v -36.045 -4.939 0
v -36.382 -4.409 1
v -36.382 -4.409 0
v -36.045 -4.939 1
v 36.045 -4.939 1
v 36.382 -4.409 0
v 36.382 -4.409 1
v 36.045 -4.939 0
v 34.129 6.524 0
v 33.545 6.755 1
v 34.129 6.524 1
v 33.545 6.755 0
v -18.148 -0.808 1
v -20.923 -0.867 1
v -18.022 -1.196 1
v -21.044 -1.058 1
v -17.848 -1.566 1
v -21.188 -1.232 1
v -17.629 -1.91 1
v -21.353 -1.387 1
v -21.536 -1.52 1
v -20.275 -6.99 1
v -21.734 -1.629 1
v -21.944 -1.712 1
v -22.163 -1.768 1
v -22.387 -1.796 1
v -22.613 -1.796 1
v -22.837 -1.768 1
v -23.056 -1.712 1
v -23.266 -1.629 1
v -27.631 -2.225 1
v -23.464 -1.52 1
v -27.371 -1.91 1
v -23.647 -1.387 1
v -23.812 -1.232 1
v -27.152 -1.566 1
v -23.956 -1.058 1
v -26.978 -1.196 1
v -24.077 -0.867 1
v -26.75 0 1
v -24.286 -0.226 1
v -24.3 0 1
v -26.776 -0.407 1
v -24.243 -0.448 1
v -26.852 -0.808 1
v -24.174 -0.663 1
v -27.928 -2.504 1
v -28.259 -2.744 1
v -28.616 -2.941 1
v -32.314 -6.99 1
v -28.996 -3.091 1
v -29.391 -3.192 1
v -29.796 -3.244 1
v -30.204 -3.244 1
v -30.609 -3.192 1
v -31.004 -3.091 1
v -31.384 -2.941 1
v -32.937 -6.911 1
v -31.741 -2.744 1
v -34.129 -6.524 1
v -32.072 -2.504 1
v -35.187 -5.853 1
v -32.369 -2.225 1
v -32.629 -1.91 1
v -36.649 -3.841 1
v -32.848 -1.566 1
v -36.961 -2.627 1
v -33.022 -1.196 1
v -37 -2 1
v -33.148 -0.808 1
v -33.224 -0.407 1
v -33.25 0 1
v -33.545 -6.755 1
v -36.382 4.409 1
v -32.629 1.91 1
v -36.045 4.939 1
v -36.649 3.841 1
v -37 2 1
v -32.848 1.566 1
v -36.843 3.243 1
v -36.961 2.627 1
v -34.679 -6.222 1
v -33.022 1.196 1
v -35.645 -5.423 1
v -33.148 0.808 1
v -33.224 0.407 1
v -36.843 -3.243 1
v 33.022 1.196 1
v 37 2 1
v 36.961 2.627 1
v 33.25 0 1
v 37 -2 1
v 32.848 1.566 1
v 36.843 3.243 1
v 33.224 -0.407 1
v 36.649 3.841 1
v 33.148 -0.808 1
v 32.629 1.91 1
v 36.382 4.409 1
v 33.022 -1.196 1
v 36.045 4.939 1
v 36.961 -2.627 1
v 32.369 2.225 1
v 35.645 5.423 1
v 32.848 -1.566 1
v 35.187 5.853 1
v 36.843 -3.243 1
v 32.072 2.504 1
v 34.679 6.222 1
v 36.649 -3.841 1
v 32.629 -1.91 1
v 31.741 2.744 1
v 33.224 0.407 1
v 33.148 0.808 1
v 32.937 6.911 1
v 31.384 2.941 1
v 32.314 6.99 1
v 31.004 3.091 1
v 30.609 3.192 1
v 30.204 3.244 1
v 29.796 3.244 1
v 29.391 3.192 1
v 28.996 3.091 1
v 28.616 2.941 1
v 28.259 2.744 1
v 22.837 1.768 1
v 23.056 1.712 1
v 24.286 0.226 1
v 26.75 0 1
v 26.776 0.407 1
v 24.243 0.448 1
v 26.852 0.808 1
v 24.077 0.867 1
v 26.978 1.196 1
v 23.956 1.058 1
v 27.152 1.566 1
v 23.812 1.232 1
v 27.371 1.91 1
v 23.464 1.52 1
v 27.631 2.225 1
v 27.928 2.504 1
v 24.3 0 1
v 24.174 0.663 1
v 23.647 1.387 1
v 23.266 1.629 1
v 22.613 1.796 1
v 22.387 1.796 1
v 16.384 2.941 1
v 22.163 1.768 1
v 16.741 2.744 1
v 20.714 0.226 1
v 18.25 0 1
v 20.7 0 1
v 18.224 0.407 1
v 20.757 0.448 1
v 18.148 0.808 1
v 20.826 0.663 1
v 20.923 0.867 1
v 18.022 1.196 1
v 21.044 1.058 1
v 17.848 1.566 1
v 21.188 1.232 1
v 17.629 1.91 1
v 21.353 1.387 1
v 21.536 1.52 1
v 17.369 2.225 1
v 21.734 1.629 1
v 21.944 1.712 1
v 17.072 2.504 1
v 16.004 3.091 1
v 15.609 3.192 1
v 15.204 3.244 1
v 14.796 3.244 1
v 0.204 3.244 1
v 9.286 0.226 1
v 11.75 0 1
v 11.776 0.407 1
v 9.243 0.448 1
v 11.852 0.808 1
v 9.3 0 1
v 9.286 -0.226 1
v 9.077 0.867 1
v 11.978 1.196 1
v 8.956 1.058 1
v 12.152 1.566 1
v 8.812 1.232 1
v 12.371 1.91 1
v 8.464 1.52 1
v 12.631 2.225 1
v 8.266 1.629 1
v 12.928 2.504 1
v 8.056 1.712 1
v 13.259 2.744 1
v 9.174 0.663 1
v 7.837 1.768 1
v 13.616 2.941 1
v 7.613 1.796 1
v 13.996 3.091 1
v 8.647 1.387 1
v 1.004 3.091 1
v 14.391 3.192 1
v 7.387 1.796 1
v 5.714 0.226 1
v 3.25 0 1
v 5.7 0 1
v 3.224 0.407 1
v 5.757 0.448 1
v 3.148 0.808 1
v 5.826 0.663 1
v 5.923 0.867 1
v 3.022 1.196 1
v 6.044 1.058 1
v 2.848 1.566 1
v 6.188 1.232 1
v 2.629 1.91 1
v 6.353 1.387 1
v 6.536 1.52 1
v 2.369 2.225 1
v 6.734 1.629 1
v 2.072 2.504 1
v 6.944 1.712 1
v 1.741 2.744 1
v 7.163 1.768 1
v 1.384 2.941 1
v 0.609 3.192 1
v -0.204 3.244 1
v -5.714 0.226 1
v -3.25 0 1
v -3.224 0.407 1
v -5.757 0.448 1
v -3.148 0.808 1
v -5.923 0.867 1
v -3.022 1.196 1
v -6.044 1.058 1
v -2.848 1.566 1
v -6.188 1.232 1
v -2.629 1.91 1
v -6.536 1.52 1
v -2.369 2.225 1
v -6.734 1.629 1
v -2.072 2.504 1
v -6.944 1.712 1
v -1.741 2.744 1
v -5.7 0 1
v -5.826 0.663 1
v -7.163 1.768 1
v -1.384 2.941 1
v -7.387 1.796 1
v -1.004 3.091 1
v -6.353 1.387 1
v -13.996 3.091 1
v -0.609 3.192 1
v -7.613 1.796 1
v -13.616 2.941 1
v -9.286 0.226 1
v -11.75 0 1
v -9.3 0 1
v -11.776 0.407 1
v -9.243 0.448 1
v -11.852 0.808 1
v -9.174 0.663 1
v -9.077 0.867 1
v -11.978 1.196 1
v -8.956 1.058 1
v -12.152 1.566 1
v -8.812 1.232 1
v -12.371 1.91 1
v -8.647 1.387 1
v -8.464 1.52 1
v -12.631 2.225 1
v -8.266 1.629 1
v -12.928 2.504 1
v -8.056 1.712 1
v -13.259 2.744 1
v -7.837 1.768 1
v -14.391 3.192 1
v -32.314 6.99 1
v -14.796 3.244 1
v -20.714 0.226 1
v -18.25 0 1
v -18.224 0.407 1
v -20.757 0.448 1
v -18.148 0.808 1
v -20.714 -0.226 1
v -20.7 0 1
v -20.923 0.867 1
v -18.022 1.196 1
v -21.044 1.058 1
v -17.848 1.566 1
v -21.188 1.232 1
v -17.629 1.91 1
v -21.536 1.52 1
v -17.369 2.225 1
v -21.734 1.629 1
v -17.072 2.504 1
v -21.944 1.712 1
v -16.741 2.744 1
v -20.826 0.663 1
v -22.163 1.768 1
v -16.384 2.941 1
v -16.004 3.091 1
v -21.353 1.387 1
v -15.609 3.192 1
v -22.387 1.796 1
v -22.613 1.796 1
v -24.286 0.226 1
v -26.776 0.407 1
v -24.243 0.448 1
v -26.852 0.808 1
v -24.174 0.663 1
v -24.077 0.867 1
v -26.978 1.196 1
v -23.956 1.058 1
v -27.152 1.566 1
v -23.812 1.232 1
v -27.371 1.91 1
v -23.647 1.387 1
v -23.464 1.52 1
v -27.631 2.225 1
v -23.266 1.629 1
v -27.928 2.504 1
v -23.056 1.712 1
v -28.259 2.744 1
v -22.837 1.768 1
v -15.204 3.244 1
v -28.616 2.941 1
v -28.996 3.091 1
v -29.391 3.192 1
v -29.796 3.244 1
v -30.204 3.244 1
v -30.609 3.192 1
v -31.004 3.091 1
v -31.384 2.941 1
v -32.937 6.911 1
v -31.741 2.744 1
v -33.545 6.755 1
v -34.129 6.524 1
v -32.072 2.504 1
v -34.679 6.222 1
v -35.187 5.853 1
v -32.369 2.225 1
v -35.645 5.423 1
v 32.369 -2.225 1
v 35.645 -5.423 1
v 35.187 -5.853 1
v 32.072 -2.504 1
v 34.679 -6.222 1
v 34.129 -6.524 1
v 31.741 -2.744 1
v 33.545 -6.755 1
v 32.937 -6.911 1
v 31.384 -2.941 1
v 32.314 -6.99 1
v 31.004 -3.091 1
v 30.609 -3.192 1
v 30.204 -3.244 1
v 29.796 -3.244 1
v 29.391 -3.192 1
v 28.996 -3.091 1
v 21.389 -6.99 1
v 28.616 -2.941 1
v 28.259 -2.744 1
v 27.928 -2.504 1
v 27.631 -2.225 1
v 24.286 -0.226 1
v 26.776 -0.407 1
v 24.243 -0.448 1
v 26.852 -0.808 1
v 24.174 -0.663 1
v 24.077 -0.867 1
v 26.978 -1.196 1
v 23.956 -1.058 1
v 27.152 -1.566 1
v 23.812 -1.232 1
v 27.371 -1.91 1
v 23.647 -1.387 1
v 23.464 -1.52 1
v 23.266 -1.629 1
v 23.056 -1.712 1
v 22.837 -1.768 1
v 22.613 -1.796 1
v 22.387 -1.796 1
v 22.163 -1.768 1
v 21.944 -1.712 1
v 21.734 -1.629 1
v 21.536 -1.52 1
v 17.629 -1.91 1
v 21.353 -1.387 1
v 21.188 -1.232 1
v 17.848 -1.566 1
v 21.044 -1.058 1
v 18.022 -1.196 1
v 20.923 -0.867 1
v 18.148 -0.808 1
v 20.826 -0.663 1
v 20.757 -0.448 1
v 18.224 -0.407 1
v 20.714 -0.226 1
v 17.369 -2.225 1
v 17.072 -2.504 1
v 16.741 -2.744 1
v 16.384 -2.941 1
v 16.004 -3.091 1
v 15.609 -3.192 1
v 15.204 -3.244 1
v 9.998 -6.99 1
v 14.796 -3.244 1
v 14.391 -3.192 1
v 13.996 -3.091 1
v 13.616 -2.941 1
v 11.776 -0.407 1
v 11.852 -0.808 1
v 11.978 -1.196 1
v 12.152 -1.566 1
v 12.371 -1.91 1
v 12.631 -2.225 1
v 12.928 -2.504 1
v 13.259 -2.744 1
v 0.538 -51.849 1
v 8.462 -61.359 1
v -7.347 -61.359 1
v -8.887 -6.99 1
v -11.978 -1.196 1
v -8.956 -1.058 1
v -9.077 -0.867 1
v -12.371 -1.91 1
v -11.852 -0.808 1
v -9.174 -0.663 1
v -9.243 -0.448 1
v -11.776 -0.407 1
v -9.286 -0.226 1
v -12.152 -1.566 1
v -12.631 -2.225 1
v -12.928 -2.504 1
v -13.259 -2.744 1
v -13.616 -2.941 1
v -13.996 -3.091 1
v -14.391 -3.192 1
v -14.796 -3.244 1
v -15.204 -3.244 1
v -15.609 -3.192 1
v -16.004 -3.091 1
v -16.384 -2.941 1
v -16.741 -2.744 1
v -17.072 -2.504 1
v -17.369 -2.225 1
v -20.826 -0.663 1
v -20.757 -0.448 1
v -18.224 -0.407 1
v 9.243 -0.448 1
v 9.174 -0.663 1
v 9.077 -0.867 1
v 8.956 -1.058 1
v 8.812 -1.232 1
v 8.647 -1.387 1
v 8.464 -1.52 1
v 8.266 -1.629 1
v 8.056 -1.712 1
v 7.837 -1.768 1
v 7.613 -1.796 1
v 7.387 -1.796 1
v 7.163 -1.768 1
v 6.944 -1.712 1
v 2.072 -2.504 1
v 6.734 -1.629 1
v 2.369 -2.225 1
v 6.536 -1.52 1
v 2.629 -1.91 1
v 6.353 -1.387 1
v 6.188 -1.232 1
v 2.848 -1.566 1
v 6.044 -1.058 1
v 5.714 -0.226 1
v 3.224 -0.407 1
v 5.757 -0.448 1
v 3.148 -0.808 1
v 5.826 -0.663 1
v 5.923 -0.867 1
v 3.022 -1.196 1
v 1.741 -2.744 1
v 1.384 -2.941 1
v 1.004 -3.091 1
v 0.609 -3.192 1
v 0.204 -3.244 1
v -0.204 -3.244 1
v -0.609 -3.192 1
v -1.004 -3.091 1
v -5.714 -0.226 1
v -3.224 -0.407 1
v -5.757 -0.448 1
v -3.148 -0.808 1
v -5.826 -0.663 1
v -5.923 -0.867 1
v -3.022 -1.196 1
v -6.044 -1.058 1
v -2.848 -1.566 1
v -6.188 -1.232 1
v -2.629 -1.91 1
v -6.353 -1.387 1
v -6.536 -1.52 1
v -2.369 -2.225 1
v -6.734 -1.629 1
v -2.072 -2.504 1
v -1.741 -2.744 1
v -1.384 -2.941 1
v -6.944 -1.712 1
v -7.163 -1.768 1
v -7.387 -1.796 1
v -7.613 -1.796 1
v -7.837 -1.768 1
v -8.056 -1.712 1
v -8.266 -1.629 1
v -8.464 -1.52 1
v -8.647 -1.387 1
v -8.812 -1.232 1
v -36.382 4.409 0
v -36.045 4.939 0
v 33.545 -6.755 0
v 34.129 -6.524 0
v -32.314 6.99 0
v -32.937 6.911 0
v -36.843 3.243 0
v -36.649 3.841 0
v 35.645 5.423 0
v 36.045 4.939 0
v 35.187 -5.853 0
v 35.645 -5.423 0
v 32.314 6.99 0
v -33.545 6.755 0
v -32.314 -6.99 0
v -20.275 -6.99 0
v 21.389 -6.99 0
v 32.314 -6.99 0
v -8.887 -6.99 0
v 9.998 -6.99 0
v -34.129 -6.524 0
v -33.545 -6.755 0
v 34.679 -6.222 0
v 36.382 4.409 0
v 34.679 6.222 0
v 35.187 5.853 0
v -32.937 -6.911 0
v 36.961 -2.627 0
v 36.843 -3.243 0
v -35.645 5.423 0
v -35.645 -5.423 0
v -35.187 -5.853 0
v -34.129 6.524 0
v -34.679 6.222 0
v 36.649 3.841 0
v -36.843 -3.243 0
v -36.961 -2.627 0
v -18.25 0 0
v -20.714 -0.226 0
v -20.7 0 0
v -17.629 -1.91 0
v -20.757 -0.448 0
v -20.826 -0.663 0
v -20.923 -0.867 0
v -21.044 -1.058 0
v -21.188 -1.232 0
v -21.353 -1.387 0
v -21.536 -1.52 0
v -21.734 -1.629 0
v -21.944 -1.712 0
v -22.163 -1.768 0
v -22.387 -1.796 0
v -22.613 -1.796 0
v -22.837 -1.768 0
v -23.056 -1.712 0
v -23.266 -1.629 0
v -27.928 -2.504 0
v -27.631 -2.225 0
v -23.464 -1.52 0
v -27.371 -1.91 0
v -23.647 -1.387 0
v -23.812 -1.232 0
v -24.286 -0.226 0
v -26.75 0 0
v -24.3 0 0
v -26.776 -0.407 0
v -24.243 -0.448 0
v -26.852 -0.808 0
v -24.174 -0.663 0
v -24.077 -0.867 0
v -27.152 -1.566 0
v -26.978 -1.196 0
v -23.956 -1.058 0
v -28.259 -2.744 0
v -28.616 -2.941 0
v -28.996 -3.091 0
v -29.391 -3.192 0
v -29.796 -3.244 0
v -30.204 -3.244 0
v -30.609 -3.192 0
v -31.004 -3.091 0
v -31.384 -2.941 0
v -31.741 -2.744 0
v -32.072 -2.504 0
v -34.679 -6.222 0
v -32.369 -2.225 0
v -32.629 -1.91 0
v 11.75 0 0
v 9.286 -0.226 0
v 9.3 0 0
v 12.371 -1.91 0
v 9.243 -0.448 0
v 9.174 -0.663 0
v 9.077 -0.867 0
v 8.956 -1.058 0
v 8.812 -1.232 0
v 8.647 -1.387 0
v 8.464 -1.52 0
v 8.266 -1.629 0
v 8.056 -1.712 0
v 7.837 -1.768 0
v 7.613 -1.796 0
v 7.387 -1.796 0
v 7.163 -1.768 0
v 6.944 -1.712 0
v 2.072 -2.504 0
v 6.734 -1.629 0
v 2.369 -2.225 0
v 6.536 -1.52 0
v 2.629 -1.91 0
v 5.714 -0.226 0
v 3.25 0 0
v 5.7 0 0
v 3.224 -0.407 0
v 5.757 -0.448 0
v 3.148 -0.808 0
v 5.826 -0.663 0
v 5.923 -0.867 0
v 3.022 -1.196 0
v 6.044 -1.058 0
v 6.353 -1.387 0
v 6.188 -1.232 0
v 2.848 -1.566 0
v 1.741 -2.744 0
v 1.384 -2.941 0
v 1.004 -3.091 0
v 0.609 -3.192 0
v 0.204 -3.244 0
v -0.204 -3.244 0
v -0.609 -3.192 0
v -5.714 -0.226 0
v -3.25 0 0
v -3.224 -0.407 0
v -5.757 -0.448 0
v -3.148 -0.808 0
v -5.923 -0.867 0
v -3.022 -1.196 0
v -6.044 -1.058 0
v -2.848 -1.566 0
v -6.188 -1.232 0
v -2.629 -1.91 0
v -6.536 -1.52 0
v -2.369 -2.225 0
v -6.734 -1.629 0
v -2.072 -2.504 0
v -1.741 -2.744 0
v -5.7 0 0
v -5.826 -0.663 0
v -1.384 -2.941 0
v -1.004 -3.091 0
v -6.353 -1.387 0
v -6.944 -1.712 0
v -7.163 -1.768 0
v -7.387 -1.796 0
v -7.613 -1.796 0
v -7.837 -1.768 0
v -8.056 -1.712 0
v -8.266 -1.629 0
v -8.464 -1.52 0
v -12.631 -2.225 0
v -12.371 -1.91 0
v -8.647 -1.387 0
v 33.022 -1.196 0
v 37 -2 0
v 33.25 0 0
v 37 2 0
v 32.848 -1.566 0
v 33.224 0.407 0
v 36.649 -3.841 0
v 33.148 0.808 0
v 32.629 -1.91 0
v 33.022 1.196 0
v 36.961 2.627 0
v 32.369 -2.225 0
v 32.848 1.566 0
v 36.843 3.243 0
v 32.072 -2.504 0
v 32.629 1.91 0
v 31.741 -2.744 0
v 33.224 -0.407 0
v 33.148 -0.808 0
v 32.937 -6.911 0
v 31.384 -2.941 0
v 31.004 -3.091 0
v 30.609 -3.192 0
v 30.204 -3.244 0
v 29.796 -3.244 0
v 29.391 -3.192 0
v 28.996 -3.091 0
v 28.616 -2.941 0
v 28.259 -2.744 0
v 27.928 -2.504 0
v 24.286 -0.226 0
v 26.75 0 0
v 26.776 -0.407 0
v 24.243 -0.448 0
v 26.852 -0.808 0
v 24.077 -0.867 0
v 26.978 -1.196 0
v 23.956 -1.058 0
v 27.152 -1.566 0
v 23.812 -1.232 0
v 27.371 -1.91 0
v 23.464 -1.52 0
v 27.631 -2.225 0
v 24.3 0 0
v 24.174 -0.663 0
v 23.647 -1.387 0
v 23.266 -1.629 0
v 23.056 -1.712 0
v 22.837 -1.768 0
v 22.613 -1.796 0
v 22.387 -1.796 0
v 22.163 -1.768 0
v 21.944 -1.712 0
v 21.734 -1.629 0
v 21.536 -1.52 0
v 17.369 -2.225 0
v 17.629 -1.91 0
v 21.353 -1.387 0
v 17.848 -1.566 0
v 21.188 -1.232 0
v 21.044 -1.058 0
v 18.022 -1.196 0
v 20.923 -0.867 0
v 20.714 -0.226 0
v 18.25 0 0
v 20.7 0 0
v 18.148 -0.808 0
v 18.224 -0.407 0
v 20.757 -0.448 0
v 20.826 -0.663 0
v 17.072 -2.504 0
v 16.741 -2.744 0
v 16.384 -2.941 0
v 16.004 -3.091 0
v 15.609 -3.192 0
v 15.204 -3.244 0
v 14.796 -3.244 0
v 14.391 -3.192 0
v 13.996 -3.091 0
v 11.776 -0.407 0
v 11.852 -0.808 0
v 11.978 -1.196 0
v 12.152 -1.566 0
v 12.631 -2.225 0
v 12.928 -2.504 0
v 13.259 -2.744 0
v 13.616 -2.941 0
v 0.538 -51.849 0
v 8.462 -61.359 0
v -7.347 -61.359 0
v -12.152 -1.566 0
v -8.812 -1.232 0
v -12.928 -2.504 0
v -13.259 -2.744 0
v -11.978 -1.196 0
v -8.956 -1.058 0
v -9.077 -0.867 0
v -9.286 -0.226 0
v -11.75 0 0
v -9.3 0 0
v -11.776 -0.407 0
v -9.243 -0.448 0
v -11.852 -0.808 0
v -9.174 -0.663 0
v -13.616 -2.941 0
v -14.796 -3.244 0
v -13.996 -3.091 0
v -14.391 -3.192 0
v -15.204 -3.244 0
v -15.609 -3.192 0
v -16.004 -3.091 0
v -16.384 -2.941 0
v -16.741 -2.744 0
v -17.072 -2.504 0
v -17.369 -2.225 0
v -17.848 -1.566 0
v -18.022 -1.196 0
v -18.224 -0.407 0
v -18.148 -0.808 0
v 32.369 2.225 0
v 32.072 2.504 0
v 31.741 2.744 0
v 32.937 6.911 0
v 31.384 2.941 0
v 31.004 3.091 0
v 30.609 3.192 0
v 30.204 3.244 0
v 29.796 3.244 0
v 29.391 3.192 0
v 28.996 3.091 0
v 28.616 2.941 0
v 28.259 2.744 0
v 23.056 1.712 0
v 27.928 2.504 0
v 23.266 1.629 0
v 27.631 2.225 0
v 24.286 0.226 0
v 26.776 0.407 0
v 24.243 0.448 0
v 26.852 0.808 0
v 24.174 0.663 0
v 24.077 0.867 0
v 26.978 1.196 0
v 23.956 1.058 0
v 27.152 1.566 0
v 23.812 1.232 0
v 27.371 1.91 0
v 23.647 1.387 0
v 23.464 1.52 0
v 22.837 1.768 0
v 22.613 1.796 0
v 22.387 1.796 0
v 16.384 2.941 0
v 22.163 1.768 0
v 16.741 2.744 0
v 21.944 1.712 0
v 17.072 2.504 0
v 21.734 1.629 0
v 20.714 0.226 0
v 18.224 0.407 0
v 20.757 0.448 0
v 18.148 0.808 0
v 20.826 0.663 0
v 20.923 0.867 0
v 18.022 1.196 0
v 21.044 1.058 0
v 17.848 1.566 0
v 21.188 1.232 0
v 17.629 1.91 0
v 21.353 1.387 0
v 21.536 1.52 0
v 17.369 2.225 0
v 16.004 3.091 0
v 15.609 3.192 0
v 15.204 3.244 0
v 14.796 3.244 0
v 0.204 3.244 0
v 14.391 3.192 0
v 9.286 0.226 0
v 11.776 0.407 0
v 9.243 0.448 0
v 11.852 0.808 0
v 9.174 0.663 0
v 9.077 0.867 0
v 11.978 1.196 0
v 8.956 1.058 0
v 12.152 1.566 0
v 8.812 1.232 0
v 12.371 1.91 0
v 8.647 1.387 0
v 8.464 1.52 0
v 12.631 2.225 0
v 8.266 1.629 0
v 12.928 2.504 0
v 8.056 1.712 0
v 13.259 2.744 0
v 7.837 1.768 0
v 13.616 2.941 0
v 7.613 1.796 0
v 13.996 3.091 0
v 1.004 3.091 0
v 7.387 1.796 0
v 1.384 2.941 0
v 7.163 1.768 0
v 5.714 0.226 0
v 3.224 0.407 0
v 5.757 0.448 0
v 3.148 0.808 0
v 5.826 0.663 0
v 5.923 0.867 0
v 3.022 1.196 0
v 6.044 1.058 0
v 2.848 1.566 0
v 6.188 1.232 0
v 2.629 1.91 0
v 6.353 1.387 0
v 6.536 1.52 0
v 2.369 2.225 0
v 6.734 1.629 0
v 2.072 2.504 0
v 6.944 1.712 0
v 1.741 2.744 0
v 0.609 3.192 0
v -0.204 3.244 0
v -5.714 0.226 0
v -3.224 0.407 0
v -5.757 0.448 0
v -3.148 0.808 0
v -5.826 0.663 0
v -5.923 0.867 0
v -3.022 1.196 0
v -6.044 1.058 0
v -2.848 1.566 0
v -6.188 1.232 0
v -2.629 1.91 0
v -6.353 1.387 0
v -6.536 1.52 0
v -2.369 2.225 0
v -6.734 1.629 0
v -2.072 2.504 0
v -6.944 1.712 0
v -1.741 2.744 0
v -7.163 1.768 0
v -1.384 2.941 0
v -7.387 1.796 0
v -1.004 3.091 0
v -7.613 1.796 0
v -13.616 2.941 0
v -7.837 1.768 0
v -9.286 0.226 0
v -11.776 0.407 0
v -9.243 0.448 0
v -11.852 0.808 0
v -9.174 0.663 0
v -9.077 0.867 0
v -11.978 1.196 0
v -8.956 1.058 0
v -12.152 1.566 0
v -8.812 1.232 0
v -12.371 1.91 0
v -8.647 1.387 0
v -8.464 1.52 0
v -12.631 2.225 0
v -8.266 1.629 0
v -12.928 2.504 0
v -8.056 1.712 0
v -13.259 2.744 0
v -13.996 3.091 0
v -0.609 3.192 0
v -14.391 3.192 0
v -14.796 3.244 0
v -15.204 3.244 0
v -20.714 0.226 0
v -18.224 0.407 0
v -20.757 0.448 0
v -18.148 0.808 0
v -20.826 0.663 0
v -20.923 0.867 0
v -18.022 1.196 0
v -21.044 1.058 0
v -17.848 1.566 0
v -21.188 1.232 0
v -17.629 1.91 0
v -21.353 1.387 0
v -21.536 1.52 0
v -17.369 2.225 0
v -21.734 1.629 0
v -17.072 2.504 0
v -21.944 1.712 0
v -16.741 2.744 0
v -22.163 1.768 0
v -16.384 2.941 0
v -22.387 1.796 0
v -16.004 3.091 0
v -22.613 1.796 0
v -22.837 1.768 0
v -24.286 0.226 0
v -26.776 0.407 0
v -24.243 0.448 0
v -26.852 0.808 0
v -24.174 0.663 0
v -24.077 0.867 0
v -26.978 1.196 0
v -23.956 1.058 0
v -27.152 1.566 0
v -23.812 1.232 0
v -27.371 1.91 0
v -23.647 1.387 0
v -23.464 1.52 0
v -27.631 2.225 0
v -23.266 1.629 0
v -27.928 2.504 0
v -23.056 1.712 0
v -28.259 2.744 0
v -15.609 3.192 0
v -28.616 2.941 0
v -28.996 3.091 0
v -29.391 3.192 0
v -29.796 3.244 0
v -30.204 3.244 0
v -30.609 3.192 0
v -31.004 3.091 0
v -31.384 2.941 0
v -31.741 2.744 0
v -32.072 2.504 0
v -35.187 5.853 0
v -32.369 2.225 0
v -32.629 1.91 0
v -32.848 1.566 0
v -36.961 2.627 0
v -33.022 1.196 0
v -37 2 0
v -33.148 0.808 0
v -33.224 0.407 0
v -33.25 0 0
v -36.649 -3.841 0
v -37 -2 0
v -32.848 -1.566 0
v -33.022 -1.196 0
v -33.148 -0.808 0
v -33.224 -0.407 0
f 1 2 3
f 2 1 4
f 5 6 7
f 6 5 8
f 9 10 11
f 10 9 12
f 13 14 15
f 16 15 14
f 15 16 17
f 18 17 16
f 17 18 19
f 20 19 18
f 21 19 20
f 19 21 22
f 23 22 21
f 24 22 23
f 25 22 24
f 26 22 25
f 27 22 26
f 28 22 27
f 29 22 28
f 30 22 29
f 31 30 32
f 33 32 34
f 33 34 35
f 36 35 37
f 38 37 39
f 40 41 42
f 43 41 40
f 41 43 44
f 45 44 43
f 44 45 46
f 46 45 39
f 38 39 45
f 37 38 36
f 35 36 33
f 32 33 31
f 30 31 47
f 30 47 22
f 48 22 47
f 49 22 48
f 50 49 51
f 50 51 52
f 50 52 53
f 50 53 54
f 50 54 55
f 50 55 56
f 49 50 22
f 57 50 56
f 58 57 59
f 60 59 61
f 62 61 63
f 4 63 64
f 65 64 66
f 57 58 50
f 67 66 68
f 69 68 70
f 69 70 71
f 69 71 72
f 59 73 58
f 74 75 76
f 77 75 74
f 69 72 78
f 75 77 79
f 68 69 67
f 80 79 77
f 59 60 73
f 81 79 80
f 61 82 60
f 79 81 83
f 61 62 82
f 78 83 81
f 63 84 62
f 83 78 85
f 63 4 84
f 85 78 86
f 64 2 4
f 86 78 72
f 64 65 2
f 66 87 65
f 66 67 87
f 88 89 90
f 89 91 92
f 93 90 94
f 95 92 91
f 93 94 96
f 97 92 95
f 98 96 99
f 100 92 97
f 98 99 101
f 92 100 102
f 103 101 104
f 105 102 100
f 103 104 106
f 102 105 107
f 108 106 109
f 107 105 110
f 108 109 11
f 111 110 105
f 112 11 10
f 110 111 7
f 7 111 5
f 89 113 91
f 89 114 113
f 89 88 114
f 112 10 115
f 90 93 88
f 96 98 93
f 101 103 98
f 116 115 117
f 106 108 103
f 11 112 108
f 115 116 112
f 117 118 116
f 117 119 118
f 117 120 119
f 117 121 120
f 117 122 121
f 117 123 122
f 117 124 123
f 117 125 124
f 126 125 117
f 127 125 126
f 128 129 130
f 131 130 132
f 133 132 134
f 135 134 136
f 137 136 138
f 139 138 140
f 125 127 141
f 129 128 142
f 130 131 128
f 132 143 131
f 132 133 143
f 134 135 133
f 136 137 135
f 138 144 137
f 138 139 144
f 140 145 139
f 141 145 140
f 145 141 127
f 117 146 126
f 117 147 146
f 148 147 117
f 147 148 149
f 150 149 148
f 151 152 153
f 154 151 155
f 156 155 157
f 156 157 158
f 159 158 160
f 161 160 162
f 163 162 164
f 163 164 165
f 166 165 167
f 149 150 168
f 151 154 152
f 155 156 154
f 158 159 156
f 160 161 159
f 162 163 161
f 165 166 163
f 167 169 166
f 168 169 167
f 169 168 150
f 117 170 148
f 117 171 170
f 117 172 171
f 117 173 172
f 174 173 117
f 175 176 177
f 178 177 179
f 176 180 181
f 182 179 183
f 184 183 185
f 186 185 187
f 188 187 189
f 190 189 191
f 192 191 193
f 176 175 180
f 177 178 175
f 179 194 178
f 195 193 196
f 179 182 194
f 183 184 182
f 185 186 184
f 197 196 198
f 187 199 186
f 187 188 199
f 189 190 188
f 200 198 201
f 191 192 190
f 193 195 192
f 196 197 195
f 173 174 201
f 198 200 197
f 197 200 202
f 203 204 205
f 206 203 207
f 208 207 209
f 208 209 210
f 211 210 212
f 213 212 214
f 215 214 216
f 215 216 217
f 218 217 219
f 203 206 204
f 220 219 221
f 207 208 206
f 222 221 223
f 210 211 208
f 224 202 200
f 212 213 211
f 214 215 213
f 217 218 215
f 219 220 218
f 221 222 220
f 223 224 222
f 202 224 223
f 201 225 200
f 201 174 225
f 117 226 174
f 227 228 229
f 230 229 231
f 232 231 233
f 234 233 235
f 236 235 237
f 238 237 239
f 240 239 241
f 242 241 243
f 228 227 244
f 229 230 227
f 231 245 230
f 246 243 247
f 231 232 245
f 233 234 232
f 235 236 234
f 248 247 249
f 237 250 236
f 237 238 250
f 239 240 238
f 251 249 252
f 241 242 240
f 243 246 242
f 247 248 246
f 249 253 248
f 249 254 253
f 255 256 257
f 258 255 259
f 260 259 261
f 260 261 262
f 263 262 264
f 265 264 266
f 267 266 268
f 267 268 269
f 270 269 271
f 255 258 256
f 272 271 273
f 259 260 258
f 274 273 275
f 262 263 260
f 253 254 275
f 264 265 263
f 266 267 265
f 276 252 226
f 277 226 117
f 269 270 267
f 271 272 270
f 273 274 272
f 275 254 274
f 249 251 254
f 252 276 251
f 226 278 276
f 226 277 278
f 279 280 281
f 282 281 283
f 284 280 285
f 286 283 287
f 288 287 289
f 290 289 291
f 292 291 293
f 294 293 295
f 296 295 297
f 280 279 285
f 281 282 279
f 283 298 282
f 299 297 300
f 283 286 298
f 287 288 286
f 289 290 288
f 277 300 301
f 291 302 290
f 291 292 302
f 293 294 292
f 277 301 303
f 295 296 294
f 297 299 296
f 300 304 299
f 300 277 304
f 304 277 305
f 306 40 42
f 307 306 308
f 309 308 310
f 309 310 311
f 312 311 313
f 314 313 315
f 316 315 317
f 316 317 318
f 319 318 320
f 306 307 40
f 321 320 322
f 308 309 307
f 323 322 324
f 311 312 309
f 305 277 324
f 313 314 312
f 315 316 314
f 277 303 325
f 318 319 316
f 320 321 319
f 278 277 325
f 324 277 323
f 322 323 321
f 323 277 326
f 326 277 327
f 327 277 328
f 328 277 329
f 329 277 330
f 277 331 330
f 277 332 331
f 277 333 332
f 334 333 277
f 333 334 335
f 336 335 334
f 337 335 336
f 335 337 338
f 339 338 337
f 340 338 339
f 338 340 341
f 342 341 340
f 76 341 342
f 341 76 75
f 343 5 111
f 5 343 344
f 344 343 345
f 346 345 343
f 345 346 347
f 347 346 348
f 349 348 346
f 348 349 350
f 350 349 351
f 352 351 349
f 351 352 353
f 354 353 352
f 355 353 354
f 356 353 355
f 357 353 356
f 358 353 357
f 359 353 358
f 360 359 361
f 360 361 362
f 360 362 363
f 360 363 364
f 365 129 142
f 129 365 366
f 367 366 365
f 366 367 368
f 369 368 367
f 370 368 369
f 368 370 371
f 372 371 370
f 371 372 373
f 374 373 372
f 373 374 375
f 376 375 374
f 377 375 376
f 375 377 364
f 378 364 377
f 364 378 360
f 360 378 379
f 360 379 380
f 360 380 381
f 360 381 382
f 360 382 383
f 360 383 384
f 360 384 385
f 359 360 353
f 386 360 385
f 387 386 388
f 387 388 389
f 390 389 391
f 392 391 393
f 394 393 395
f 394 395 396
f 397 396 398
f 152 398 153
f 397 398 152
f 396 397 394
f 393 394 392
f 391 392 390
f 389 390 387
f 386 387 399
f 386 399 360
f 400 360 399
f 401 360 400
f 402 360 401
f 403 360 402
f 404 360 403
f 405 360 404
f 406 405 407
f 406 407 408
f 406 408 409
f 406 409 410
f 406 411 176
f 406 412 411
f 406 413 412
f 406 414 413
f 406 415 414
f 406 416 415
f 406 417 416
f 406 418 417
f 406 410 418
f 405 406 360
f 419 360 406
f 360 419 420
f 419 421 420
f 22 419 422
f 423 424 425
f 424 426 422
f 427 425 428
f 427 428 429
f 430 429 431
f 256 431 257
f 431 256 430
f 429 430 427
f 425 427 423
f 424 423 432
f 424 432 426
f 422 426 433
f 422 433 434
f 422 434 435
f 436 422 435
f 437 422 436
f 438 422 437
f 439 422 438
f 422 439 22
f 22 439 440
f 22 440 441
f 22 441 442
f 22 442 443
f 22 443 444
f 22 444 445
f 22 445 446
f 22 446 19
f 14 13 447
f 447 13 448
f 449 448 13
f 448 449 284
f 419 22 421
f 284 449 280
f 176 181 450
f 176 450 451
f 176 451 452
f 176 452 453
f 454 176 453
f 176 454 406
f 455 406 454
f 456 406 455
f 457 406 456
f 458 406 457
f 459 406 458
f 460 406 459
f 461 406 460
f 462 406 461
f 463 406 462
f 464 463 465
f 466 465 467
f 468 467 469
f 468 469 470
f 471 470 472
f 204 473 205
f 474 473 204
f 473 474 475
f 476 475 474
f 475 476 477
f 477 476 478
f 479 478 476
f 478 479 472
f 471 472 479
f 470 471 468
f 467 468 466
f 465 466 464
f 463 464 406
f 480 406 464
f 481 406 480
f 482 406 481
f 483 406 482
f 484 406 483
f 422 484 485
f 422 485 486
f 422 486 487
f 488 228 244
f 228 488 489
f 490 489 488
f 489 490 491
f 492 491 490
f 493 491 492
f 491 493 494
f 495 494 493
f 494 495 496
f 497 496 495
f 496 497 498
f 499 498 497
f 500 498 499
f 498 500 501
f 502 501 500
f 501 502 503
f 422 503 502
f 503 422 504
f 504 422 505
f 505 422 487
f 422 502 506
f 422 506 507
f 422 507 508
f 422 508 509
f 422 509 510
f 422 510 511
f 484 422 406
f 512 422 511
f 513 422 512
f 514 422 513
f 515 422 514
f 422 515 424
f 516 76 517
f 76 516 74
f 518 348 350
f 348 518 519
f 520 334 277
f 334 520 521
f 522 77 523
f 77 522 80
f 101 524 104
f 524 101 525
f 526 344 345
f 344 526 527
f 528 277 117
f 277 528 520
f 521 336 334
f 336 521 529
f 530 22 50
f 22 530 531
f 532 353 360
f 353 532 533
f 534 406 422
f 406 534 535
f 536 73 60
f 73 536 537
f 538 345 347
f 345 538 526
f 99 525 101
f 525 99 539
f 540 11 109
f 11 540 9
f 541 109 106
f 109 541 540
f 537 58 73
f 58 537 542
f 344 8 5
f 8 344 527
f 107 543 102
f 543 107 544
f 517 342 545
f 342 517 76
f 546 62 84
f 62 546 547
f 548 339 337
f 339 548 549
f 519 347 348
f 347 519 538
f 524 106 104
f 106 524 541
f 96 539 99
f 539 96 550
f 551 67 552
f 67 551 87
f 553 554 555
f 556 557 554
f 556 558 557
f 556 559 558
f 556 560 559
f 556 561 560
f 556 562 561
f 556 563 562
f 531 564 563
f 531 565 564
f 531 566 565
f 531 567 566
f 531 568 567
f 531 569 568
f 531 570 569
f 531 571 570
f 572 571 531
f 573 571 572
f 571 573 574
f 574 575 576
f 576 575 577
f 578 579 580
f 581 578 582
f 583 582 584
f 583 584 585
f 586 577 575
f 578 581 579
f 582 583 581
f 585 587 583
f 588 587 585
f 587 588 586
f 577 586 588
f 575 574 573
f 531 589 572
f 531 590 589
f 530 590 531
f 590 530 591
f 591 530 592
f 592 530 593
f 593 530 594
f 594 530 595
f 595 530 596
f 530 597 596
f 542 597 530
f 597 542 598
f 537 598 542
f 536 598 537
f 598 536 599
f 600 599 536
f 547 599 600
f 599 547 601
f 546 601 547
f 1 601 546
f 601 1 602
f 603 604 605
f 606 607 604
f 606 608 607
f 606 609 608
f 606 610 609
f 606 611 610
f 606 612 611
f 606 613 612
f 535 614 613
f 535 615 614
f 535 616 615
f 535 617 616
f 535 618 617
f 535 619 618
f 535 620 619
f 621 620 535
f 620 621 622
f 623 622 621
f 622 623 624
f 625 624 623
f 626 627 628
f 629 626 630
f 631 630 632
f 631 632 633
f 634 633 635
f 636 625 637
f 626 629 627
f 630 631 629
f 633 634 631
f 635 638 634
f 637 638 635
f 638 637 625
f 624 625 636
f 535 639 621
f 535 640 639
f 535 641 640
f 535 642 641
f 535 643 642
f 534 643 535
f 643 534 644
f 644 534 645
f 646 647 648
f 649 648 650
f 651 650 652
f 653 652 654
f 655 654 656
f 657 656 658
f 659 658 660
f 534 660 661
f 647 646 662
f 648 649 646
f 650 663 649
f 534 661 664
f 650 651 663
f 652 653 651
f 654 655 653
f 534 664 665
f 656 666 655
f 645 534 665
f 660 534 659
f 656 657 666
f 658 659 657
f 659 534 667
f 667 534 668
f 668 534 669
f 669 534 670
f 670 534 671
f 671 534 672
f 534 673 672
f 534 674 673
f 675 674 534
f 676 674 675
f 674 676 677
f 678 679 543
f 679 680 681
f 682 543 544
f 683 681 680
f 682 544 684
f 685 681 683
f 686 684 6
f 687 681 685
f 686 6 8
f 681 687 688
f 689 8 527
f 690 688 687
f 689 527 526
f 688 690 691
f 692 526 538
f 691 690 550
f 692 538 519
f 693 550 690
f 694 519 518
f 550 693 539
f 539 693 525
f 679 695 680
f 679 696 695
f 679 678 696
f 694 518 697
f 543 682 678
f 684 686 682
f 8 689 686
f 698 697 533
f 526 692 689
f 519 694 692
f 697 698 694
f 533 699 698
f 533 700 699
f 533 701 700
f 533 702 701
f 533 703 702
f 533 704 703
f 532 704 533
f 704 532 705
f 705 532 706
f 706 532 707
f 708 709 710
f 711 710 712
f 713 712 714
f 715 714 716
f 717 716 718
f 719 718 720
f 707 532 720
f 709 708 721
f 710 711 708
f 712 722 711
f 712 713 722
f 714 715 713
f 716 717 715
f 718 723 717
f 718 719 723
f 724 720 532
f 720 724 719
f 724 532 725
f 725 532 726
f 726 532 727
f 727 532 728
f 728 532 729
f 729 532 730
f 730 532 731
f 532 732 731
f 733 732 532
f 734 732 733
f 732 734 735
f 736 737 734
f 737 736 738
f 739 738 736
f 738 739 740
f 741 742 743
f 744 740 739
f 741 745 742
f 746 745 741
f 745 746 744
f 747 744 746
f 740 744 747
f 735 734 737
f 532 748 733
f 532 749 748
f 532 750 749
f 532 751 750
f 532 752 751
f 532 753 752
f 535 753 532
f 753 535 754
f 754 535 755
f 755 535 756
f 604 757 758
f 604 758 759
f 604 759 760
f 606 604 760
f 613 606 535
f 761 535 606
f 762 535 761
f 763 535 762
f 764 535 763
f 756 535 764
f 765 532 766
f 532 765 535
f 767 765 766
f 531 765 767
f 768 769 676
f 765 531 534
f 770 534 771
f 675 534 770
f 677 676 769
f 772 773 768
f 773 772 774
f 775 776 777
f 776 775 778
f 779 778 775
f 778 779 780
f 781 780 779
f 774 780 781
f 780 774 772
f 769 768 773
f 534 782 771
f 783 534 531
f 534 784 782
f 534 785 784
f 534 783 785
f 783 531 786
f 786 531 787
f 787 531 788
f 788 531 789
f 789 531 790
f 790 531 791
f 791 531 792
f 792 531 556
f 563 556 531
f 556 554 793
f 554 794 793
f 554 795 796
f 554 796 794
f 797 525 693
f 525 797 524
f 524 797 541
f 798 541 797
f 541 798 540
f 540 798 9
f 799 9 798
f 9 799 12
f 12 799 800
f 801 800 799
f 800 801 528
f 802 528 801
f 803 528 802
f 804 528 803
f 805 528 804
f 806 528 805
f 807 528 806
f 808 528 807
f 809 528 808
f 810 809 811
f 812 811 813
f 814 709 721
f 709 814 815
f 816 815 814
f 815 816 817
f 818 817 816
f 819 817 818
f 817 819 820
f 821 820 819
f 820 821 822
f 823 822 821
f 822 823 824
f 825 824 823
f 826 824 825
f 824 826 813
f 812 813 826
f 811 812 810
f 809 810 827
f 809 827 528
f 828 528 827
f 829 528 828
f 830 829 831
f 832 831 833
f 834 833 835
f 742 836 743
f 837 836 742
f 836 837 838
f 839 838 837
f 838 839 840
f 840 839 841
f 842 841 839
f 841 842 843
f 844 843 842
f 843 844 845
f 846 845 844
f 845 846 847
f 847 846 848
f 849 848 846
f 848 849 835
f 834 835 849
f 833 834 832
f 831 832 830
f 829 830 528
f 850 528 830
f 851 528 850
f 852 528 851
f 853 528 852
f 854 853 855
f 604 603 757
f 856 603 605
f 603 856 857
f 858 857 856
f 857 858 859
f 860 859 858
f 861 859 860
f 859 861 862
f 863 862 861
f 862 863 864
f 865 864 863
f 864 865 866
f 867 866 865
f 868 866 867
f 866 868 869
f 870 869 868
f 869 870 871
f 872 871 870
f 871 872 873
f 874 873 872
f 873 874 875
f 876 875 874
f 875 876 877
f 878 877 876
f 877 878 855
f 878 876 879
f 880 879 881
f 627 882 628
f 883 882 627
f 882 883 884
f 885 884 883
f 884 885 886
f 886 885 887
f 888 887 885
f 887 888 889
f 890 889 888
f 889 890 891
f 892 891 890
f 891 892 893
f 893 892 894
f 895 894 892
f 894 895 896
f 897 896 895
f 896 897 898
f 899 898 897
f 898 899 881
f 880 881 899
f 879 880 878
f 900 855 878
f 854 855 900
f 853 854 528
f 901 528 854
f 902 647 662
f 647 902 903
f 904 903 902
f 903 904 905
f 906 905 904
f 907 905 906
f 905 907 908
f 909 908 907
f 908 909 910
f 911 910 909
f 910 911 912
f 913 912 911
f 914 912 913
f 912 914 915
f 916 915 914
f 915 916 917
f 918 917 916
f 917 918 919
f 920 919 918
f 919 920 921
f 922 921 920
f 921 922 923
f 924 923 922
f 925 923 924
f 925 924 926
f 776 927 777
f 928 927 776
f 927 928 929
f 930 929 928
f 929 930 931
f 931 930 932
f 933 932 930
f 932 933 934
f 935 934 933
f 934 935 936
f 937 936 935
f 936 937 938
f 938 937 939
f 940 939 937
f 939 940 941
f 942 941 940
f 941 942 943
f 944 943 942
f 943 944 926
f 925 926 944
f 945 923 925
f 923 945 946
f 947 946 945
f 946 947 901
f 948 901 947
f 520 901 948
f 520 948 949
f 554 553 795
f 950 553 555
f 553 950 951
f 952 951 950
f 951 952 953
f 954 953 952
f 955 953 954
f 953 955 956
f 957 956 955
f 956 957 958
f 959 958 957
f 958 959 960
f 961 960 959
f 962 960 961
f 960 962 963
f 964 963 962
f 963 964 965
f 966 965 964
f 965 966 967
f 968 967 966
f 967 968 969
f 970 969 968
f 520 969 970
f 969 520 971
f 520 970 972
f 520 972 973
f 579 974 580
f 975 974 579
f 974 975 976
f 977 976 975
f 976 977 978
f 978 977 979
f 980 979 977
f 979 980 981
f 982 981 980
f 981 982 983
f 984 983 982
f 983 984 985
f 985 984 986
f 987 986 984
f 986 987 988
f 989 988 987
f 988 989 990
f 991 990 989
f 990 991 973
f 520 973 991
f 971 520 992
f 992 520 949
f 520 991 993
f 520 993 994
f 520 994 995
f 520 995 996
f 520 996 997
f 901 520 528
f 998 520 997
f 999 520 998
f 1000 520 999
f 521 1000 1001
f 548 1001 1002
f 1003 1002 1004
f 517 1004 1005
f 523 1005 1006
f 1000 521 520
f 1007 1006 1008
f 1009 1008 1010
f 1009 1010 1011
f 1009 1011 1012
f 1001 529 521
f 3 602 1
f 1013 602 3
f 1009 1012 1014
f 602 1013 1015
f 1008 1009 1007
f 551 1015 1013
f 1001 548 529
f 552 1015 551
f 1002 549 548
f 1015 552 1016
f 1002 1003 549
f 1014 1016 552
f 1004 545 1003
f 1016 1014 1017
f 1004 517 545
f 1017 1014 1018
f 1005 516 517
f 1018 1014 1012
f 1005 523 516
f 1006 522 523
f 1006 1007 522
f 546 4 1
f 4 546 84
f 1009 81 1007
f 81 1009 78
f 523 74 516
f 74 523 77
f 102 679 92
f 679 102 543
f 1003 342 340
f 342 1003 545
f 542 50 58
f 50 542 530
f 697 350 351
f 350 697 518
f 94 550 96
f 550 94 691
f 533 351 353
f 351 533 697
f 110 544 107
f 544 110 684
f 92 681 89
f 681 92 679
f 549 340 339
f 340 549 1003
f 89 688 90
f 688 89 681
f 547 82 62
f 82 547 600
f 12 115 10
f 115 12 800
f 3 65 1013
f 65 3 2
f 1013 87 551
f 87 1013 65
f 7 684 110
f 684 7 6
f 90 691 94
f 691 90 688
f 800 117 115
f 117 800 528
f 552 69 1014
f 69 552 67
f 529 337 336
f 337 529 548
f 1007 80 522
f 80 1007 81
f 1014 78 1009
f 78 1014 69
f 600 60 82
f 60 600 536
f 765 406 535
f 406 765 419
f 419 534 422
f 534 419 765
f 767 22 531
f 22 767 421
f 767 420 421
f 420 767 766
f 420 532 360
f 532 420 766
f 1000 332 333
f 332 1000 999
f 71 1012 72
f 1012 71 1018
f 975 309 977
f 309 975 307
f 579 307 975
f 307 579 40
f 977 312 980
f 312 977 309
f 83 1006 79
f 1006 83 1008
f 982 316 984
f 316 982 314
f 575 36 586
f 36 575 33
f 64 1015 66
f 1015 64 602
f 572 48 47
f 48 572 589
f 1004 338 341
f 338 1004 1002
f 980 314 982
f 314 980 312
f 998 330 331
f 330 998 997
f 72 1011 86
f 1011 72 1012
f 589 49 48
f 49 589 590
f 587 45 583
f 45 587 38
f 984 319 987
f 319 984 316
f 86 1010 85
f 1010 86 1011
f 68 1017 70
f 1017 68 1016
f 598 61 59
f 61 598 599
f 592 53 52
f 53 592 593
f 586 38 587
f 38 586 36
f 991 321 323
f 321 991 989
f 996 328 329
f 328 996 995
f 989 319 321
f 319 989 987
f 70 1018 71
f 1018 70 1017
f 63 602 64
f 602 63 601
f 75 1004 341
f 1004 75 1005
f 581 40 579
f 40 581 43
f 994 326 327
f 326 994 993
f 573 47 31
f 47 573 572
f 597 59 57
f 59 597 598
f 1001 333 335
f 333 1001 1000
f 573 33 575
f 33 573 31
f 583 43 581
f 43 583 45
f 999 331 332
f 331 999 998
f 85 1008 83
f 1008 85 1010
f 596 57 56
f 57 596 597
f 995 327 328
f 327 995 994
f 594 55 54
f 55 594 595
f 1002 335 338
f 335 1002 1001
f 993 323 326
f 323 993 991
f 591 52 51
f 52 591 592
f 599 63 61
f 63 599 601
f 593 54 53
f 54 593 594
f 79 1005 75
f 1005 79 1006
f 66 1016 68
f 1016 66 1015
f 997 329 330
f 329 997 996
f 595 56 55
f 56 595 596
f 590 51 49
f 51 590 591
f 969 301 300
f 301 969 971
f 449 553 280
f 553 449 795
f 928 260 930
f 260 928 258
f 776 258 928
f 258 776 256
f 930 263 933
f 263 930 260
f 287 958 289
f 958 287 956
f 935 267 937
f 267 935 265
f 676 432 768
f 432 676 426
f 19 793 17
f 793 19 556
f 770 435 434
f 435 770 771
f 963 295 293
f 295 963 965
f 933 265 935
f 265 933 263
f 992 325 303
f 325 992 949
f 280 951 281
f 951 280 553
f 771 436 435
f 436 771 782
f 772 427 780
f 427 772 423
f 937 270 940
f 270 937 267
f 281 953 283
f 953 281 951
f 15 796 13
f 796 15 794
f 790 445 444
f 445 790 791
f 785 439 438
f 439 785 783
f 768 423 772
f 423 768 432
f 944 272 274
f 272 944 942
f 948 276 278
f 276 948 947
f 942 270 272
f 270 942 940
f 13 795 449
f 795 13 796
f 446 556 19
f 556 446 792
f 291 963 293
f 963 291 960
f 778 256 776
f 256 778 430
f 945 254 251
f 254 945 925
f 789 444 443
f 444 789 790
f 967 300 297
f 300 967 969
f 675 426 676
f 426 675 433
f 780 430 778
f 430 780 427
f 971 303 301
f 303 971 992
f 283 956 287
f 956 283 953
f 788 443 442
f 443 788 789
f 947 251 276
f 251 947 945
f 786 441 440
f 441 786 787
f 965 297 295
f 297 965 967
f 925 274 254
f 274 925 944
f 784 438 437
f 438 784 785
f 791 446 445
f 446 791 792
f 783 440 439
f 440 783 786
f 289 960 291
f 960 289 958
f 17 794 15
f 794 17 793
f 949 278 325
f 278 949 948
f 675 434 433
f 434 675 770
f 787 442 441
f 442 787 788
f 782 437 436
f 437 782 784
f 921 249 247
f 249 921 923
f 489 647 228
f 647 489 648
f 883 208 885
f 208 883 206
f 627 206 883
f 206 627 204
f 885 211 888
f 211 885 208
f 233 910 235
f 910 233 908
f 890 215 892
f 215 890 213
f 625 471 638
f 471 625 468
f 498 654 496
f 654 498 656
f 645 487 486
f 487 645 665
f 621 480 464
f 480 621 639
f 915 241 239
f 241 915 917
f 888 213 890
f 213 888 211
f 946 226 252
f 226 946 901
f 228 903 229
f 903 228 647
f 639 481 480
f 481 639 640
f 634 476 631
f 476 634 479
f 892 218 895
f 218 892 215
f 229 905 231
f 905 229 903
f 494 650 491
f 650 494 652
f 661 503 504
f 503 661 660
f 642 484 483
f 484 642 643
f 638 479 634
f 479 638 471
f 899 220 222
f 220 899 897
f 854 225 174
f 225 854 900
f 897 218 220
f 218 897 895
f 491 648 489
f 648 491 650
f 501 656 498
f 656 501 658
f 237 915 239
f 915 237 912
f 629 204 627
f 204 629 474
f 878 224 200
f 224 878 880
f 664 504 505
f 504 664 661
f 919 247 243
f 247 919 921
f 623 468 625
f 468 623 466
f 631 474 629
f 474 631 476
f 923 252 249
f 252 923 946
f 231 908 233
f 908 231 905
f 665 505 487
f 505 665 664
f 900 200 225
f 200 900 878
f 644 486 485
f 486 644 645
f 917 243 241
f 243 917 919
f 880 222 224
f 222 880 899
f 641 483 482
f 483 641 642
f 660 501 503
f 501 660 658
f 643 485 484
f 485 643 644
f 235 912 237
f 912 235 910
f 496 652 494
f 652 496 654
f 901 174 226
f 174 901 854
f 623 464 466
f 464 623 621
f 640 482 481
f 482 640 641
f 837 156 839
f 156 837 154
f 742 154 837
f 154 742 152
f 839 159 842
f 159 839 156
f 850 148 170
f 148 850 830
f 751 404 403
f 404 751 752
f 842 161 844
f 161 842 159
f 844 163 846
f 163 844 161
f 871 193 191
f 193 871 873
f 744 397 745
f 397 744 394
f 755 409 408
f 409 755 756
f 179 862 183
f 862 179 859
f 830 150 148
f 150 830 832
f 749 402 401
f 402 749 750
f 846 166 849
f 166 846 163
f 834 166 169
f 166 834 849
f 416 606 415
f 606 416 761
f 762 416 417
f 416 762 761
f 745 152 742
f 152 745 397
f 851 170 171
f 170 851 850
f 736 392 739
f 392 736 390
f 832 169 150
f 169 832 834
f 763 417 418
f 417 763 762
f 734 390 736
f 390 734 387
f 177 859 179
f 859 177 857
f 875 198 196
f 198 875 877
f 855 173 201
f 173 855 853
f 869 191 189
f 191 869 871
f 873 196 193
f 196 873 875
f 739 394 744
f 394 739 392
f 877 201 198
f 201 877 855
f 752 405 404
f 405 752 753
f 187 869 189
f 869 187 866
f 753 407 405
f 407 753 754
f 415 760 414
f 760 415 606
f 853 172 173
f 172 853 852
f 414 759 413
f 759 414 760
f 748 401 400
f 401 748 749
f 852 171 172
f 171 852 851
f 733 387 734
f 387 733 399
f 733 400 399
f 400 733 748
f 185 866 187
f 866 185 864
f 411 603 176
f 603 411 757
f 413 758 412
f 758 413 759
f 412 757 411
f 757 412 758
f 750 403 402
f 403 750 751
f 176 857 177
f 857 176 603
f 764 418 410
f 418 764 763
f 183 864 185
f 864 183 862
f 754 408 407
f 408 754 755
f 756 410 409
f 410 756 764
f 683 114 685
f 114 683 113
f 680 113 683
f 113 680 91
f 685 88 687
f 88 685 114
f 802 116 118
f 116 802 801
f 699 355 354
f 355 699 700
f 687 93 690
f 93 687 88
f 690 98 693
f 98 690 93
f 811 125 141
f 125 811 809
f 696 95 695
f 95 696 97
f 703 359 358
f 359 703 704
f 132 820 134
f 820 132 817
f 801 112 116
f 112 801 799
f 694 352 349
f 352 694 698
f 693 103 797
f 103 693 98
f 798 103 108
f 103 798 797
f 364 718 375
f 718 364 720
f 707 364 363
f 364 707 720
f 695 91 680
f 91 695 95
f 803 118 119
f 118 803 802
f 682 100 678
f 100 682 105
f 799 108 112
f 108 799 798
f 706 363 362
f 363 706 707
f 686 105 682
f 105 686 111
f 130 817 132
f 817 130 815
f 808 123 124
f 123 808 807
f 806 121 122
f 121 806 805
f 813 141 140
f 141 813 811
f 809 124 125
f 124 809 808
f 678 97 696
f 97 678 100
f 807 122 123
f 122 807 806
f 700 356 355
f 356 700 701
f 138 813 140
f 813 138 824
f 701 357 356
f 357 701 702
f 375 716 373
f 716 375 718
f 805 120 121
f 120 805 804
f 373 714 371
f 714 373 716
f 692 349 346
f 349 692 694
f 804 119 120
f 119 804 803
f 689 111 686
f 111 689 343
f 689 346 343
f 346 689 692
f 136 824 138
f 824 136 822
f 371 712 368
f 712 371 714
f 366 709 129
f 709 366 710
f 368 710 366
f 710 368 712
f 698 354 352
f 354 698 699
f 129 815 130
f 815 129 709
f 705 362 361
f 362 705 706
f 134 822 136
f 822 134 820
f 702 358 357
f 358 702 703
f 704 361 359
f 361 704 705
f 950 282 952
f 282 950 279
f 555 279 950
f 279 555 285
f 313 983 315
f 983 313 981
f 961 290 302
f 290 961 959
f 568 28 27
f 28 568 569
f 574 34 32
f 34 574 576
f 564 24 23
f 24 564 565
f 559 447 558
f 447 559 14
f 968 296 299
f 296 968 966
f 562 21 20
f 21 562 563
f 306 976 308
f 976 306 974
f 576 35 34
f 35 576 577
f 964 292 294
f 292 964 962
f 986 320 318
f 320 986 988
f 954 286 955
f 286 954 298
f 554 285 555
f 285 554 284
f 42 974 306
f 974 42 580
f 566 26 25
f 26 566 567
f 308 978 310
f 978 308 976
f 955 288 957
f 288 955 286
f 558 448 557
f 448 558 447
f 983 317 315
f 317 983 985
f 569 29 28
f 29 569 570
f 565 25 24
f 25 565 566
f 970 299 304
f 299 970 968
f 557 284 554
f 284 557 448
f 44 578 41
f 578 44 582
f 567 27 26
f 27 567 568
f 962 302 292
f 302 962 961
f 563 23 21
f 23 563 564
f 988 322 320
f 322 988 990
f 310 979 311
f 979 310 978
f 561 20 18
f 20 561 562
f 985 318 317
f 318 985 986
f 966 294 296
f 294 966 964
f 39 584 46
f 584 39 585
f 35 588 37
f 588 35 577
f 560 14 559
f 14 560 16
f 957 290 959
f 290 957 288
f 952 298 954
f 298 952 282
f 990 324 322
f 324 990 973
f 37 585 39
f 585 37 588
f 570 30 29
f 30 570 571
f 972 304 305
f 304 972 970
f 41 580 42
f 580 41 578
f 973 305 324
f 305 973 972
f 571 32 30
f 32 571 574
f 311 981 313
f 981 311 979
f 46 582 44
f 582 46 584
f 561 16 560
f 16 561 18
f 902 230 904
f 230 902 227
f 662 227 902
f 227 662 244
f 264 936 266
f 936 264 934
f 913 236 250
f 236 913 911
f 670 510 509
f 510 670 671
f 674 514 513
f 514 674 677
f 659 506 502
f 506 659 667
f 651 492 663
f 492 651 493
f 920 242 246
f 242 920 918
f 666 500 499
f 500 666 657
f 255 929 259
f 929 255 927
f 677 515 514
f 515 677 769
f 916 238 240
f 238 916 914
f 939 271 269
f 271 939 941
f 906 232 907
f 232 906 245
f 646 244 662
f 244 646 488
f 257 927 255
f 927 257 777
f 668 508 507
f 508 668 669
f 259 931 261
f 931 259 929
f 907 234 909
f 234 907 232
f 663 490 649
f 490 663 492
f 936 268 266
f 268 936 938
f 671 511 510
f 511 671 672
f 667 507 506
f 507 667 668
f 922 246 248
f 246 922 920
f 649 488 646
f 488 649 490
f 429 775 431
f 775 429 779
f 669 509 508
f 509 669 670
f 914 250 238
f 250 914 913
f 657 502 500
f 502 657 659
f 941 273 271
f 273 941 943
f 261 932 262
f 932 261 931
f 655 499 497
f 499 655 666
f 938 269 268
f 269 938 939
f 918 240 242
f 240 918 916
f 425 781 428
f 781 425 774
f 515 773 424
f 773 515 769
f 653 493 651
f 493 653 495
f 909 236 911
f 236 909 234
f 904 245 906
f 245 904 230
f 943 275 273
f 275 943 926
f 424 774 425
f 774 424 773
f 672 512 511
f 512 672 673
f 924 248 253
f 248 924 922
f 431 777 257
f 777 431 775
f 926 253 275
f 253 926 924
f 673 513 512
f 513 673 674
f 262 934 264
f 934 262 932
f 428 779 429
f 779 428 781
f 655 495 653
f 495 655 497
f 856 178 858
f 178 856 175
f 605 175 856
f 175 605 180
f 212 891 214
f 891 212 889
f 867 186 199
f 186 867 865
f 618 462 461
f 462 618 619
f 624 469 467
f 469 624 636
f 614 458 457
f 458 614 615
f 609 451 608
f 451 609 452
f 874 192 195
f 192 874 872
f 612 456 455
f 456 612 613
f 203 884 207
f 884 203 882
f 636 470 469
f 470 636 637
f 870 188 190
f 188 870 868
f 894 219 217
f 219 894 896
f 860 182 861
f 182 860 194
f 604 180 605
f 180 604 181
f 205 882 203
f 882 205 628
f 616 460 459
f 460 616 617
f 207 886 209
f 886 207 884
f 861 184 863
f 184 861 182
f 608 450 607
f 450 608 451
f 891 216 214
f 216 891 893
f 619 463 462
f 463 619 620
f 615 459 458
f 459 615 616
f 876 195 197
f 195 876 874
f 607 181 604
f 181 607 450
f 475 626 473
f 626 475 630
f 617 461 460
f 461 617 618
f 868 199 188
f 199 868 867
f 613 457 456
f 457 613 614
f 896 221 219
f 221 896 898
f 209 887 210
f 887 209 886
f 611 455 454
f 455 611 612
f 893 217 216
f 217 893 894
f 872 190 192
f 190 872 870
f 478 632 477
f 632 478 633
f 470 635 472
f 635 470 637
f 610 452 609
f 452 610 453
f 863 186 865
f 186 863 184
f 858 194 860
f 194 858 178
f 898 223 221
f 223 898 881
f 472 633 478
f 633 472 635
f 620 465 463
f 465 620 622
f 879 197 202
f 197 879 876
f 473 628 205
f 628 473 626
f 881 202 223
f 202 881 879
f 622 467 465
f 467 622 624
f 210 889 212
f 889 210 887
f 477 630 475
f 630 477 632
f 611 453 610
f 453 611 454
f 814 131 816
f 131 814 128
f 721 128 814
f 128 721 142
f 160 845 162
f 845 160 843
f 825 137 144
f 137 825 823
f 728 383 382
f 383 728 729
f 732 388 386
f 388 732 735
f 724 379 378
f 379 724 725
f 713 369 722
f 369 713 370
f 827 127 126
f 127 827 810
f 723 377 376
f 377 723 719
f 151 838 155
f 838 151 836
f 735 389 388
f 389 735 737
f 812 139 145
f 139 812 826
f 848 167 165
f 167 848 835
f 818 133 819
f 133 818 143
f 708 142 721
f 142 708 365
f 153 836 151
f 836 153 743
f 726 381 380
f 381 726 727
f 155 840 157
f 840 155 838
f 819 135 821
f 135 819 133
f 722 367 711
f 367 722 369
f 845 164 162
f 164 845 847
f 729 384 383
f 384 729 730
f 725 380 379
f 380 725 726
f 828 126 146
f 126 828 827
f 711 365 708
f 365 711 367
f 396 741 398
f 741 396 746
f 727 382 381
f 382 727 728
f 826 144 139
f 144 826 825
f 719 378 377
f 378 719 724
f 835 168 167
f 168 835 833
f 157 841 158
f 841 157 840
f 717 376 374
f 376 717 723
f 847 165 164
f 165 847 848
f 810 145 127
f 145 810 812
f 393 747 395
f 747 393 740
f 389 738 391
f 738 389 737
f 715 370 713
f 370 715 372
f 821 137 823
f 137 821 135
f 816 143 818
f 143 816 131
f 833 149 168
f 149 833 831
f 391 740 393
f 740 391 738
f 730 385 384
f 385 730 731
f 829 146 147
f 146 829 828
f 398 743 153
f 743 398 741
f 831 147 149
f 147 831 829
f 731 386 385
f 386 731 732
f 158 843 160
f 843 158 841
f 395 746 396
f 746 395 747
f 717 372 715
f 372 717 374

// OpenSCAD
$fn = 50;


difference() {
	union() {
		*color(alpha = 1.0000000000, c = "gray") {
			translate(v = [0, 14, 0]) {
				linear_extrude(height = 1) {
					text(font = "Arial:style=Bold", halign = "center", size = 4.5000000000, text = "COMMENT description oobb_plate_shape_p_type_1_depth_5_width_1_thickness_v_extra_oobb_size", valign = "center");
				}
			}
		}
		hull() {
			translate(v = [-32.0000000000, 2.0000000000, 0]) {
				cylinder(h = 1, r = 5);
			}
			translate(v = [32.0000000000, 2.0000000000, 0]) {
				cylinder(h = 1, r = 5);
			}
			translate(v = [-32.0000000000, -2.0000000000, 0]) {
				cylinder(h = 1, r = 5);
			}
			translate(v = [32.0000000000, -2.0000000000, 0]) {
				cylinder(h = 1, r = 5);
			}
		}
		translate(v = [0, -5, 0]) {
			linear_extrude(height = 1) {
				text(font = "DejaVu Sans Mono:style=Bold", halign = "center", size = 57.0000000000, text = "V", valign = "top");
			}
		}
	}
	union() {
		*color(alpha = 1.0000000000, c = "gray") {
			translate(v = [0, 14, 0]) {
				linear_extrude(height = 1) {
					text(font = "Arial:style=Bold", halign = "center", size = 4.5000000000, text = "COMMENT description oobb_holes_shape_n_type_5_width_1_thickness_v_extra_oobb_size_1_height_'all'_holes_true_both_holes", valign = "center");
				}
			}
		}
		translate(v = [-30.0000000000, 0.0000000000, 0]) {
			translate(v = [0, 0, -50]) {
				cylinder(h = 100, r = 3.2500000000);
			}
		}
		translate(v = [-15.0000000000, 0.0000000000, 0]) {
			translate(v = [0, 0, -50]) {
				cylinder(h = 100, r = 3.2500000000);
			}
		}
		translate(v = [0, 0, -50]) {
			cylinder(h = 100, r = 3.2500000000);
		}
		translate(v = [15.0000000000, 0.0000000000, 0]) {
			translate(v = [0, 0, -50]) {
				cylinder(h = 100, r = 3.2500000000);
			}
		}
		translate(v = [30.0000000000, 0.0000000000, 0]) {
			translate(v = [0, 0, -50]) {
				cylinder(h = 100, r = 3.2500000000);
			}
		}
		translate(v = [-30.0000000000, 0.0000000000, 0]) {
			translate(v = [0, 0, -50]) {
				cylinder(h = 100, r = 1.8000000000);
			}
		}
		translate(v = [-22.5000000000, 0.0000000000, 0]) {
			translate(v = [0, 0, -50]) {
				cylinder(h = 100, r = 1.8000000000);
			}
		}
		translate(v = [-15.0000000000, 0.0000000000, 0]) {
			translate(v = [0, 0, -50]) {
				cylinder(h = 100, r = 1.8000000000);
			}
		}
		translate(v = [-7.5000000000, 0.0000000000, 0]) {
			translate(v = [0, 0, -50]) {
				cylinder(h = 100, r = 1.8000000000);
			}
		}
		translate(v = [0, 0, -50]) {
			cylinder(h = 100, r = 1.8000000000);
		}
		translate(v = [7.5000000000, 0.0000000000, 0]) {
			translate(v = [0, 0, -50]) {
				cylinder(h = 100, r = 1.8000000000);
			}
		}
		translate(v = [15.0000000000, 0.0000000000, 0]) {
			translate(v = [0, 0, -50]) {
				cylinder(h = 100, r = 1.8000000000);
			}
		}
		translate(v = [22.5000000000, 0.0000000000, 0]) {
			translate(v = [0, 0, -50]) {
				cylinder(h = 100, r = 1.8000000000);
			}
		}
		translate(v = [30.0000000000, 0.0000000000, 0]) {
			translate(v = [0, 0, -50]) {
				cylinder(h = 100, r = 1.8000000000);
			}
		}
	}
}
